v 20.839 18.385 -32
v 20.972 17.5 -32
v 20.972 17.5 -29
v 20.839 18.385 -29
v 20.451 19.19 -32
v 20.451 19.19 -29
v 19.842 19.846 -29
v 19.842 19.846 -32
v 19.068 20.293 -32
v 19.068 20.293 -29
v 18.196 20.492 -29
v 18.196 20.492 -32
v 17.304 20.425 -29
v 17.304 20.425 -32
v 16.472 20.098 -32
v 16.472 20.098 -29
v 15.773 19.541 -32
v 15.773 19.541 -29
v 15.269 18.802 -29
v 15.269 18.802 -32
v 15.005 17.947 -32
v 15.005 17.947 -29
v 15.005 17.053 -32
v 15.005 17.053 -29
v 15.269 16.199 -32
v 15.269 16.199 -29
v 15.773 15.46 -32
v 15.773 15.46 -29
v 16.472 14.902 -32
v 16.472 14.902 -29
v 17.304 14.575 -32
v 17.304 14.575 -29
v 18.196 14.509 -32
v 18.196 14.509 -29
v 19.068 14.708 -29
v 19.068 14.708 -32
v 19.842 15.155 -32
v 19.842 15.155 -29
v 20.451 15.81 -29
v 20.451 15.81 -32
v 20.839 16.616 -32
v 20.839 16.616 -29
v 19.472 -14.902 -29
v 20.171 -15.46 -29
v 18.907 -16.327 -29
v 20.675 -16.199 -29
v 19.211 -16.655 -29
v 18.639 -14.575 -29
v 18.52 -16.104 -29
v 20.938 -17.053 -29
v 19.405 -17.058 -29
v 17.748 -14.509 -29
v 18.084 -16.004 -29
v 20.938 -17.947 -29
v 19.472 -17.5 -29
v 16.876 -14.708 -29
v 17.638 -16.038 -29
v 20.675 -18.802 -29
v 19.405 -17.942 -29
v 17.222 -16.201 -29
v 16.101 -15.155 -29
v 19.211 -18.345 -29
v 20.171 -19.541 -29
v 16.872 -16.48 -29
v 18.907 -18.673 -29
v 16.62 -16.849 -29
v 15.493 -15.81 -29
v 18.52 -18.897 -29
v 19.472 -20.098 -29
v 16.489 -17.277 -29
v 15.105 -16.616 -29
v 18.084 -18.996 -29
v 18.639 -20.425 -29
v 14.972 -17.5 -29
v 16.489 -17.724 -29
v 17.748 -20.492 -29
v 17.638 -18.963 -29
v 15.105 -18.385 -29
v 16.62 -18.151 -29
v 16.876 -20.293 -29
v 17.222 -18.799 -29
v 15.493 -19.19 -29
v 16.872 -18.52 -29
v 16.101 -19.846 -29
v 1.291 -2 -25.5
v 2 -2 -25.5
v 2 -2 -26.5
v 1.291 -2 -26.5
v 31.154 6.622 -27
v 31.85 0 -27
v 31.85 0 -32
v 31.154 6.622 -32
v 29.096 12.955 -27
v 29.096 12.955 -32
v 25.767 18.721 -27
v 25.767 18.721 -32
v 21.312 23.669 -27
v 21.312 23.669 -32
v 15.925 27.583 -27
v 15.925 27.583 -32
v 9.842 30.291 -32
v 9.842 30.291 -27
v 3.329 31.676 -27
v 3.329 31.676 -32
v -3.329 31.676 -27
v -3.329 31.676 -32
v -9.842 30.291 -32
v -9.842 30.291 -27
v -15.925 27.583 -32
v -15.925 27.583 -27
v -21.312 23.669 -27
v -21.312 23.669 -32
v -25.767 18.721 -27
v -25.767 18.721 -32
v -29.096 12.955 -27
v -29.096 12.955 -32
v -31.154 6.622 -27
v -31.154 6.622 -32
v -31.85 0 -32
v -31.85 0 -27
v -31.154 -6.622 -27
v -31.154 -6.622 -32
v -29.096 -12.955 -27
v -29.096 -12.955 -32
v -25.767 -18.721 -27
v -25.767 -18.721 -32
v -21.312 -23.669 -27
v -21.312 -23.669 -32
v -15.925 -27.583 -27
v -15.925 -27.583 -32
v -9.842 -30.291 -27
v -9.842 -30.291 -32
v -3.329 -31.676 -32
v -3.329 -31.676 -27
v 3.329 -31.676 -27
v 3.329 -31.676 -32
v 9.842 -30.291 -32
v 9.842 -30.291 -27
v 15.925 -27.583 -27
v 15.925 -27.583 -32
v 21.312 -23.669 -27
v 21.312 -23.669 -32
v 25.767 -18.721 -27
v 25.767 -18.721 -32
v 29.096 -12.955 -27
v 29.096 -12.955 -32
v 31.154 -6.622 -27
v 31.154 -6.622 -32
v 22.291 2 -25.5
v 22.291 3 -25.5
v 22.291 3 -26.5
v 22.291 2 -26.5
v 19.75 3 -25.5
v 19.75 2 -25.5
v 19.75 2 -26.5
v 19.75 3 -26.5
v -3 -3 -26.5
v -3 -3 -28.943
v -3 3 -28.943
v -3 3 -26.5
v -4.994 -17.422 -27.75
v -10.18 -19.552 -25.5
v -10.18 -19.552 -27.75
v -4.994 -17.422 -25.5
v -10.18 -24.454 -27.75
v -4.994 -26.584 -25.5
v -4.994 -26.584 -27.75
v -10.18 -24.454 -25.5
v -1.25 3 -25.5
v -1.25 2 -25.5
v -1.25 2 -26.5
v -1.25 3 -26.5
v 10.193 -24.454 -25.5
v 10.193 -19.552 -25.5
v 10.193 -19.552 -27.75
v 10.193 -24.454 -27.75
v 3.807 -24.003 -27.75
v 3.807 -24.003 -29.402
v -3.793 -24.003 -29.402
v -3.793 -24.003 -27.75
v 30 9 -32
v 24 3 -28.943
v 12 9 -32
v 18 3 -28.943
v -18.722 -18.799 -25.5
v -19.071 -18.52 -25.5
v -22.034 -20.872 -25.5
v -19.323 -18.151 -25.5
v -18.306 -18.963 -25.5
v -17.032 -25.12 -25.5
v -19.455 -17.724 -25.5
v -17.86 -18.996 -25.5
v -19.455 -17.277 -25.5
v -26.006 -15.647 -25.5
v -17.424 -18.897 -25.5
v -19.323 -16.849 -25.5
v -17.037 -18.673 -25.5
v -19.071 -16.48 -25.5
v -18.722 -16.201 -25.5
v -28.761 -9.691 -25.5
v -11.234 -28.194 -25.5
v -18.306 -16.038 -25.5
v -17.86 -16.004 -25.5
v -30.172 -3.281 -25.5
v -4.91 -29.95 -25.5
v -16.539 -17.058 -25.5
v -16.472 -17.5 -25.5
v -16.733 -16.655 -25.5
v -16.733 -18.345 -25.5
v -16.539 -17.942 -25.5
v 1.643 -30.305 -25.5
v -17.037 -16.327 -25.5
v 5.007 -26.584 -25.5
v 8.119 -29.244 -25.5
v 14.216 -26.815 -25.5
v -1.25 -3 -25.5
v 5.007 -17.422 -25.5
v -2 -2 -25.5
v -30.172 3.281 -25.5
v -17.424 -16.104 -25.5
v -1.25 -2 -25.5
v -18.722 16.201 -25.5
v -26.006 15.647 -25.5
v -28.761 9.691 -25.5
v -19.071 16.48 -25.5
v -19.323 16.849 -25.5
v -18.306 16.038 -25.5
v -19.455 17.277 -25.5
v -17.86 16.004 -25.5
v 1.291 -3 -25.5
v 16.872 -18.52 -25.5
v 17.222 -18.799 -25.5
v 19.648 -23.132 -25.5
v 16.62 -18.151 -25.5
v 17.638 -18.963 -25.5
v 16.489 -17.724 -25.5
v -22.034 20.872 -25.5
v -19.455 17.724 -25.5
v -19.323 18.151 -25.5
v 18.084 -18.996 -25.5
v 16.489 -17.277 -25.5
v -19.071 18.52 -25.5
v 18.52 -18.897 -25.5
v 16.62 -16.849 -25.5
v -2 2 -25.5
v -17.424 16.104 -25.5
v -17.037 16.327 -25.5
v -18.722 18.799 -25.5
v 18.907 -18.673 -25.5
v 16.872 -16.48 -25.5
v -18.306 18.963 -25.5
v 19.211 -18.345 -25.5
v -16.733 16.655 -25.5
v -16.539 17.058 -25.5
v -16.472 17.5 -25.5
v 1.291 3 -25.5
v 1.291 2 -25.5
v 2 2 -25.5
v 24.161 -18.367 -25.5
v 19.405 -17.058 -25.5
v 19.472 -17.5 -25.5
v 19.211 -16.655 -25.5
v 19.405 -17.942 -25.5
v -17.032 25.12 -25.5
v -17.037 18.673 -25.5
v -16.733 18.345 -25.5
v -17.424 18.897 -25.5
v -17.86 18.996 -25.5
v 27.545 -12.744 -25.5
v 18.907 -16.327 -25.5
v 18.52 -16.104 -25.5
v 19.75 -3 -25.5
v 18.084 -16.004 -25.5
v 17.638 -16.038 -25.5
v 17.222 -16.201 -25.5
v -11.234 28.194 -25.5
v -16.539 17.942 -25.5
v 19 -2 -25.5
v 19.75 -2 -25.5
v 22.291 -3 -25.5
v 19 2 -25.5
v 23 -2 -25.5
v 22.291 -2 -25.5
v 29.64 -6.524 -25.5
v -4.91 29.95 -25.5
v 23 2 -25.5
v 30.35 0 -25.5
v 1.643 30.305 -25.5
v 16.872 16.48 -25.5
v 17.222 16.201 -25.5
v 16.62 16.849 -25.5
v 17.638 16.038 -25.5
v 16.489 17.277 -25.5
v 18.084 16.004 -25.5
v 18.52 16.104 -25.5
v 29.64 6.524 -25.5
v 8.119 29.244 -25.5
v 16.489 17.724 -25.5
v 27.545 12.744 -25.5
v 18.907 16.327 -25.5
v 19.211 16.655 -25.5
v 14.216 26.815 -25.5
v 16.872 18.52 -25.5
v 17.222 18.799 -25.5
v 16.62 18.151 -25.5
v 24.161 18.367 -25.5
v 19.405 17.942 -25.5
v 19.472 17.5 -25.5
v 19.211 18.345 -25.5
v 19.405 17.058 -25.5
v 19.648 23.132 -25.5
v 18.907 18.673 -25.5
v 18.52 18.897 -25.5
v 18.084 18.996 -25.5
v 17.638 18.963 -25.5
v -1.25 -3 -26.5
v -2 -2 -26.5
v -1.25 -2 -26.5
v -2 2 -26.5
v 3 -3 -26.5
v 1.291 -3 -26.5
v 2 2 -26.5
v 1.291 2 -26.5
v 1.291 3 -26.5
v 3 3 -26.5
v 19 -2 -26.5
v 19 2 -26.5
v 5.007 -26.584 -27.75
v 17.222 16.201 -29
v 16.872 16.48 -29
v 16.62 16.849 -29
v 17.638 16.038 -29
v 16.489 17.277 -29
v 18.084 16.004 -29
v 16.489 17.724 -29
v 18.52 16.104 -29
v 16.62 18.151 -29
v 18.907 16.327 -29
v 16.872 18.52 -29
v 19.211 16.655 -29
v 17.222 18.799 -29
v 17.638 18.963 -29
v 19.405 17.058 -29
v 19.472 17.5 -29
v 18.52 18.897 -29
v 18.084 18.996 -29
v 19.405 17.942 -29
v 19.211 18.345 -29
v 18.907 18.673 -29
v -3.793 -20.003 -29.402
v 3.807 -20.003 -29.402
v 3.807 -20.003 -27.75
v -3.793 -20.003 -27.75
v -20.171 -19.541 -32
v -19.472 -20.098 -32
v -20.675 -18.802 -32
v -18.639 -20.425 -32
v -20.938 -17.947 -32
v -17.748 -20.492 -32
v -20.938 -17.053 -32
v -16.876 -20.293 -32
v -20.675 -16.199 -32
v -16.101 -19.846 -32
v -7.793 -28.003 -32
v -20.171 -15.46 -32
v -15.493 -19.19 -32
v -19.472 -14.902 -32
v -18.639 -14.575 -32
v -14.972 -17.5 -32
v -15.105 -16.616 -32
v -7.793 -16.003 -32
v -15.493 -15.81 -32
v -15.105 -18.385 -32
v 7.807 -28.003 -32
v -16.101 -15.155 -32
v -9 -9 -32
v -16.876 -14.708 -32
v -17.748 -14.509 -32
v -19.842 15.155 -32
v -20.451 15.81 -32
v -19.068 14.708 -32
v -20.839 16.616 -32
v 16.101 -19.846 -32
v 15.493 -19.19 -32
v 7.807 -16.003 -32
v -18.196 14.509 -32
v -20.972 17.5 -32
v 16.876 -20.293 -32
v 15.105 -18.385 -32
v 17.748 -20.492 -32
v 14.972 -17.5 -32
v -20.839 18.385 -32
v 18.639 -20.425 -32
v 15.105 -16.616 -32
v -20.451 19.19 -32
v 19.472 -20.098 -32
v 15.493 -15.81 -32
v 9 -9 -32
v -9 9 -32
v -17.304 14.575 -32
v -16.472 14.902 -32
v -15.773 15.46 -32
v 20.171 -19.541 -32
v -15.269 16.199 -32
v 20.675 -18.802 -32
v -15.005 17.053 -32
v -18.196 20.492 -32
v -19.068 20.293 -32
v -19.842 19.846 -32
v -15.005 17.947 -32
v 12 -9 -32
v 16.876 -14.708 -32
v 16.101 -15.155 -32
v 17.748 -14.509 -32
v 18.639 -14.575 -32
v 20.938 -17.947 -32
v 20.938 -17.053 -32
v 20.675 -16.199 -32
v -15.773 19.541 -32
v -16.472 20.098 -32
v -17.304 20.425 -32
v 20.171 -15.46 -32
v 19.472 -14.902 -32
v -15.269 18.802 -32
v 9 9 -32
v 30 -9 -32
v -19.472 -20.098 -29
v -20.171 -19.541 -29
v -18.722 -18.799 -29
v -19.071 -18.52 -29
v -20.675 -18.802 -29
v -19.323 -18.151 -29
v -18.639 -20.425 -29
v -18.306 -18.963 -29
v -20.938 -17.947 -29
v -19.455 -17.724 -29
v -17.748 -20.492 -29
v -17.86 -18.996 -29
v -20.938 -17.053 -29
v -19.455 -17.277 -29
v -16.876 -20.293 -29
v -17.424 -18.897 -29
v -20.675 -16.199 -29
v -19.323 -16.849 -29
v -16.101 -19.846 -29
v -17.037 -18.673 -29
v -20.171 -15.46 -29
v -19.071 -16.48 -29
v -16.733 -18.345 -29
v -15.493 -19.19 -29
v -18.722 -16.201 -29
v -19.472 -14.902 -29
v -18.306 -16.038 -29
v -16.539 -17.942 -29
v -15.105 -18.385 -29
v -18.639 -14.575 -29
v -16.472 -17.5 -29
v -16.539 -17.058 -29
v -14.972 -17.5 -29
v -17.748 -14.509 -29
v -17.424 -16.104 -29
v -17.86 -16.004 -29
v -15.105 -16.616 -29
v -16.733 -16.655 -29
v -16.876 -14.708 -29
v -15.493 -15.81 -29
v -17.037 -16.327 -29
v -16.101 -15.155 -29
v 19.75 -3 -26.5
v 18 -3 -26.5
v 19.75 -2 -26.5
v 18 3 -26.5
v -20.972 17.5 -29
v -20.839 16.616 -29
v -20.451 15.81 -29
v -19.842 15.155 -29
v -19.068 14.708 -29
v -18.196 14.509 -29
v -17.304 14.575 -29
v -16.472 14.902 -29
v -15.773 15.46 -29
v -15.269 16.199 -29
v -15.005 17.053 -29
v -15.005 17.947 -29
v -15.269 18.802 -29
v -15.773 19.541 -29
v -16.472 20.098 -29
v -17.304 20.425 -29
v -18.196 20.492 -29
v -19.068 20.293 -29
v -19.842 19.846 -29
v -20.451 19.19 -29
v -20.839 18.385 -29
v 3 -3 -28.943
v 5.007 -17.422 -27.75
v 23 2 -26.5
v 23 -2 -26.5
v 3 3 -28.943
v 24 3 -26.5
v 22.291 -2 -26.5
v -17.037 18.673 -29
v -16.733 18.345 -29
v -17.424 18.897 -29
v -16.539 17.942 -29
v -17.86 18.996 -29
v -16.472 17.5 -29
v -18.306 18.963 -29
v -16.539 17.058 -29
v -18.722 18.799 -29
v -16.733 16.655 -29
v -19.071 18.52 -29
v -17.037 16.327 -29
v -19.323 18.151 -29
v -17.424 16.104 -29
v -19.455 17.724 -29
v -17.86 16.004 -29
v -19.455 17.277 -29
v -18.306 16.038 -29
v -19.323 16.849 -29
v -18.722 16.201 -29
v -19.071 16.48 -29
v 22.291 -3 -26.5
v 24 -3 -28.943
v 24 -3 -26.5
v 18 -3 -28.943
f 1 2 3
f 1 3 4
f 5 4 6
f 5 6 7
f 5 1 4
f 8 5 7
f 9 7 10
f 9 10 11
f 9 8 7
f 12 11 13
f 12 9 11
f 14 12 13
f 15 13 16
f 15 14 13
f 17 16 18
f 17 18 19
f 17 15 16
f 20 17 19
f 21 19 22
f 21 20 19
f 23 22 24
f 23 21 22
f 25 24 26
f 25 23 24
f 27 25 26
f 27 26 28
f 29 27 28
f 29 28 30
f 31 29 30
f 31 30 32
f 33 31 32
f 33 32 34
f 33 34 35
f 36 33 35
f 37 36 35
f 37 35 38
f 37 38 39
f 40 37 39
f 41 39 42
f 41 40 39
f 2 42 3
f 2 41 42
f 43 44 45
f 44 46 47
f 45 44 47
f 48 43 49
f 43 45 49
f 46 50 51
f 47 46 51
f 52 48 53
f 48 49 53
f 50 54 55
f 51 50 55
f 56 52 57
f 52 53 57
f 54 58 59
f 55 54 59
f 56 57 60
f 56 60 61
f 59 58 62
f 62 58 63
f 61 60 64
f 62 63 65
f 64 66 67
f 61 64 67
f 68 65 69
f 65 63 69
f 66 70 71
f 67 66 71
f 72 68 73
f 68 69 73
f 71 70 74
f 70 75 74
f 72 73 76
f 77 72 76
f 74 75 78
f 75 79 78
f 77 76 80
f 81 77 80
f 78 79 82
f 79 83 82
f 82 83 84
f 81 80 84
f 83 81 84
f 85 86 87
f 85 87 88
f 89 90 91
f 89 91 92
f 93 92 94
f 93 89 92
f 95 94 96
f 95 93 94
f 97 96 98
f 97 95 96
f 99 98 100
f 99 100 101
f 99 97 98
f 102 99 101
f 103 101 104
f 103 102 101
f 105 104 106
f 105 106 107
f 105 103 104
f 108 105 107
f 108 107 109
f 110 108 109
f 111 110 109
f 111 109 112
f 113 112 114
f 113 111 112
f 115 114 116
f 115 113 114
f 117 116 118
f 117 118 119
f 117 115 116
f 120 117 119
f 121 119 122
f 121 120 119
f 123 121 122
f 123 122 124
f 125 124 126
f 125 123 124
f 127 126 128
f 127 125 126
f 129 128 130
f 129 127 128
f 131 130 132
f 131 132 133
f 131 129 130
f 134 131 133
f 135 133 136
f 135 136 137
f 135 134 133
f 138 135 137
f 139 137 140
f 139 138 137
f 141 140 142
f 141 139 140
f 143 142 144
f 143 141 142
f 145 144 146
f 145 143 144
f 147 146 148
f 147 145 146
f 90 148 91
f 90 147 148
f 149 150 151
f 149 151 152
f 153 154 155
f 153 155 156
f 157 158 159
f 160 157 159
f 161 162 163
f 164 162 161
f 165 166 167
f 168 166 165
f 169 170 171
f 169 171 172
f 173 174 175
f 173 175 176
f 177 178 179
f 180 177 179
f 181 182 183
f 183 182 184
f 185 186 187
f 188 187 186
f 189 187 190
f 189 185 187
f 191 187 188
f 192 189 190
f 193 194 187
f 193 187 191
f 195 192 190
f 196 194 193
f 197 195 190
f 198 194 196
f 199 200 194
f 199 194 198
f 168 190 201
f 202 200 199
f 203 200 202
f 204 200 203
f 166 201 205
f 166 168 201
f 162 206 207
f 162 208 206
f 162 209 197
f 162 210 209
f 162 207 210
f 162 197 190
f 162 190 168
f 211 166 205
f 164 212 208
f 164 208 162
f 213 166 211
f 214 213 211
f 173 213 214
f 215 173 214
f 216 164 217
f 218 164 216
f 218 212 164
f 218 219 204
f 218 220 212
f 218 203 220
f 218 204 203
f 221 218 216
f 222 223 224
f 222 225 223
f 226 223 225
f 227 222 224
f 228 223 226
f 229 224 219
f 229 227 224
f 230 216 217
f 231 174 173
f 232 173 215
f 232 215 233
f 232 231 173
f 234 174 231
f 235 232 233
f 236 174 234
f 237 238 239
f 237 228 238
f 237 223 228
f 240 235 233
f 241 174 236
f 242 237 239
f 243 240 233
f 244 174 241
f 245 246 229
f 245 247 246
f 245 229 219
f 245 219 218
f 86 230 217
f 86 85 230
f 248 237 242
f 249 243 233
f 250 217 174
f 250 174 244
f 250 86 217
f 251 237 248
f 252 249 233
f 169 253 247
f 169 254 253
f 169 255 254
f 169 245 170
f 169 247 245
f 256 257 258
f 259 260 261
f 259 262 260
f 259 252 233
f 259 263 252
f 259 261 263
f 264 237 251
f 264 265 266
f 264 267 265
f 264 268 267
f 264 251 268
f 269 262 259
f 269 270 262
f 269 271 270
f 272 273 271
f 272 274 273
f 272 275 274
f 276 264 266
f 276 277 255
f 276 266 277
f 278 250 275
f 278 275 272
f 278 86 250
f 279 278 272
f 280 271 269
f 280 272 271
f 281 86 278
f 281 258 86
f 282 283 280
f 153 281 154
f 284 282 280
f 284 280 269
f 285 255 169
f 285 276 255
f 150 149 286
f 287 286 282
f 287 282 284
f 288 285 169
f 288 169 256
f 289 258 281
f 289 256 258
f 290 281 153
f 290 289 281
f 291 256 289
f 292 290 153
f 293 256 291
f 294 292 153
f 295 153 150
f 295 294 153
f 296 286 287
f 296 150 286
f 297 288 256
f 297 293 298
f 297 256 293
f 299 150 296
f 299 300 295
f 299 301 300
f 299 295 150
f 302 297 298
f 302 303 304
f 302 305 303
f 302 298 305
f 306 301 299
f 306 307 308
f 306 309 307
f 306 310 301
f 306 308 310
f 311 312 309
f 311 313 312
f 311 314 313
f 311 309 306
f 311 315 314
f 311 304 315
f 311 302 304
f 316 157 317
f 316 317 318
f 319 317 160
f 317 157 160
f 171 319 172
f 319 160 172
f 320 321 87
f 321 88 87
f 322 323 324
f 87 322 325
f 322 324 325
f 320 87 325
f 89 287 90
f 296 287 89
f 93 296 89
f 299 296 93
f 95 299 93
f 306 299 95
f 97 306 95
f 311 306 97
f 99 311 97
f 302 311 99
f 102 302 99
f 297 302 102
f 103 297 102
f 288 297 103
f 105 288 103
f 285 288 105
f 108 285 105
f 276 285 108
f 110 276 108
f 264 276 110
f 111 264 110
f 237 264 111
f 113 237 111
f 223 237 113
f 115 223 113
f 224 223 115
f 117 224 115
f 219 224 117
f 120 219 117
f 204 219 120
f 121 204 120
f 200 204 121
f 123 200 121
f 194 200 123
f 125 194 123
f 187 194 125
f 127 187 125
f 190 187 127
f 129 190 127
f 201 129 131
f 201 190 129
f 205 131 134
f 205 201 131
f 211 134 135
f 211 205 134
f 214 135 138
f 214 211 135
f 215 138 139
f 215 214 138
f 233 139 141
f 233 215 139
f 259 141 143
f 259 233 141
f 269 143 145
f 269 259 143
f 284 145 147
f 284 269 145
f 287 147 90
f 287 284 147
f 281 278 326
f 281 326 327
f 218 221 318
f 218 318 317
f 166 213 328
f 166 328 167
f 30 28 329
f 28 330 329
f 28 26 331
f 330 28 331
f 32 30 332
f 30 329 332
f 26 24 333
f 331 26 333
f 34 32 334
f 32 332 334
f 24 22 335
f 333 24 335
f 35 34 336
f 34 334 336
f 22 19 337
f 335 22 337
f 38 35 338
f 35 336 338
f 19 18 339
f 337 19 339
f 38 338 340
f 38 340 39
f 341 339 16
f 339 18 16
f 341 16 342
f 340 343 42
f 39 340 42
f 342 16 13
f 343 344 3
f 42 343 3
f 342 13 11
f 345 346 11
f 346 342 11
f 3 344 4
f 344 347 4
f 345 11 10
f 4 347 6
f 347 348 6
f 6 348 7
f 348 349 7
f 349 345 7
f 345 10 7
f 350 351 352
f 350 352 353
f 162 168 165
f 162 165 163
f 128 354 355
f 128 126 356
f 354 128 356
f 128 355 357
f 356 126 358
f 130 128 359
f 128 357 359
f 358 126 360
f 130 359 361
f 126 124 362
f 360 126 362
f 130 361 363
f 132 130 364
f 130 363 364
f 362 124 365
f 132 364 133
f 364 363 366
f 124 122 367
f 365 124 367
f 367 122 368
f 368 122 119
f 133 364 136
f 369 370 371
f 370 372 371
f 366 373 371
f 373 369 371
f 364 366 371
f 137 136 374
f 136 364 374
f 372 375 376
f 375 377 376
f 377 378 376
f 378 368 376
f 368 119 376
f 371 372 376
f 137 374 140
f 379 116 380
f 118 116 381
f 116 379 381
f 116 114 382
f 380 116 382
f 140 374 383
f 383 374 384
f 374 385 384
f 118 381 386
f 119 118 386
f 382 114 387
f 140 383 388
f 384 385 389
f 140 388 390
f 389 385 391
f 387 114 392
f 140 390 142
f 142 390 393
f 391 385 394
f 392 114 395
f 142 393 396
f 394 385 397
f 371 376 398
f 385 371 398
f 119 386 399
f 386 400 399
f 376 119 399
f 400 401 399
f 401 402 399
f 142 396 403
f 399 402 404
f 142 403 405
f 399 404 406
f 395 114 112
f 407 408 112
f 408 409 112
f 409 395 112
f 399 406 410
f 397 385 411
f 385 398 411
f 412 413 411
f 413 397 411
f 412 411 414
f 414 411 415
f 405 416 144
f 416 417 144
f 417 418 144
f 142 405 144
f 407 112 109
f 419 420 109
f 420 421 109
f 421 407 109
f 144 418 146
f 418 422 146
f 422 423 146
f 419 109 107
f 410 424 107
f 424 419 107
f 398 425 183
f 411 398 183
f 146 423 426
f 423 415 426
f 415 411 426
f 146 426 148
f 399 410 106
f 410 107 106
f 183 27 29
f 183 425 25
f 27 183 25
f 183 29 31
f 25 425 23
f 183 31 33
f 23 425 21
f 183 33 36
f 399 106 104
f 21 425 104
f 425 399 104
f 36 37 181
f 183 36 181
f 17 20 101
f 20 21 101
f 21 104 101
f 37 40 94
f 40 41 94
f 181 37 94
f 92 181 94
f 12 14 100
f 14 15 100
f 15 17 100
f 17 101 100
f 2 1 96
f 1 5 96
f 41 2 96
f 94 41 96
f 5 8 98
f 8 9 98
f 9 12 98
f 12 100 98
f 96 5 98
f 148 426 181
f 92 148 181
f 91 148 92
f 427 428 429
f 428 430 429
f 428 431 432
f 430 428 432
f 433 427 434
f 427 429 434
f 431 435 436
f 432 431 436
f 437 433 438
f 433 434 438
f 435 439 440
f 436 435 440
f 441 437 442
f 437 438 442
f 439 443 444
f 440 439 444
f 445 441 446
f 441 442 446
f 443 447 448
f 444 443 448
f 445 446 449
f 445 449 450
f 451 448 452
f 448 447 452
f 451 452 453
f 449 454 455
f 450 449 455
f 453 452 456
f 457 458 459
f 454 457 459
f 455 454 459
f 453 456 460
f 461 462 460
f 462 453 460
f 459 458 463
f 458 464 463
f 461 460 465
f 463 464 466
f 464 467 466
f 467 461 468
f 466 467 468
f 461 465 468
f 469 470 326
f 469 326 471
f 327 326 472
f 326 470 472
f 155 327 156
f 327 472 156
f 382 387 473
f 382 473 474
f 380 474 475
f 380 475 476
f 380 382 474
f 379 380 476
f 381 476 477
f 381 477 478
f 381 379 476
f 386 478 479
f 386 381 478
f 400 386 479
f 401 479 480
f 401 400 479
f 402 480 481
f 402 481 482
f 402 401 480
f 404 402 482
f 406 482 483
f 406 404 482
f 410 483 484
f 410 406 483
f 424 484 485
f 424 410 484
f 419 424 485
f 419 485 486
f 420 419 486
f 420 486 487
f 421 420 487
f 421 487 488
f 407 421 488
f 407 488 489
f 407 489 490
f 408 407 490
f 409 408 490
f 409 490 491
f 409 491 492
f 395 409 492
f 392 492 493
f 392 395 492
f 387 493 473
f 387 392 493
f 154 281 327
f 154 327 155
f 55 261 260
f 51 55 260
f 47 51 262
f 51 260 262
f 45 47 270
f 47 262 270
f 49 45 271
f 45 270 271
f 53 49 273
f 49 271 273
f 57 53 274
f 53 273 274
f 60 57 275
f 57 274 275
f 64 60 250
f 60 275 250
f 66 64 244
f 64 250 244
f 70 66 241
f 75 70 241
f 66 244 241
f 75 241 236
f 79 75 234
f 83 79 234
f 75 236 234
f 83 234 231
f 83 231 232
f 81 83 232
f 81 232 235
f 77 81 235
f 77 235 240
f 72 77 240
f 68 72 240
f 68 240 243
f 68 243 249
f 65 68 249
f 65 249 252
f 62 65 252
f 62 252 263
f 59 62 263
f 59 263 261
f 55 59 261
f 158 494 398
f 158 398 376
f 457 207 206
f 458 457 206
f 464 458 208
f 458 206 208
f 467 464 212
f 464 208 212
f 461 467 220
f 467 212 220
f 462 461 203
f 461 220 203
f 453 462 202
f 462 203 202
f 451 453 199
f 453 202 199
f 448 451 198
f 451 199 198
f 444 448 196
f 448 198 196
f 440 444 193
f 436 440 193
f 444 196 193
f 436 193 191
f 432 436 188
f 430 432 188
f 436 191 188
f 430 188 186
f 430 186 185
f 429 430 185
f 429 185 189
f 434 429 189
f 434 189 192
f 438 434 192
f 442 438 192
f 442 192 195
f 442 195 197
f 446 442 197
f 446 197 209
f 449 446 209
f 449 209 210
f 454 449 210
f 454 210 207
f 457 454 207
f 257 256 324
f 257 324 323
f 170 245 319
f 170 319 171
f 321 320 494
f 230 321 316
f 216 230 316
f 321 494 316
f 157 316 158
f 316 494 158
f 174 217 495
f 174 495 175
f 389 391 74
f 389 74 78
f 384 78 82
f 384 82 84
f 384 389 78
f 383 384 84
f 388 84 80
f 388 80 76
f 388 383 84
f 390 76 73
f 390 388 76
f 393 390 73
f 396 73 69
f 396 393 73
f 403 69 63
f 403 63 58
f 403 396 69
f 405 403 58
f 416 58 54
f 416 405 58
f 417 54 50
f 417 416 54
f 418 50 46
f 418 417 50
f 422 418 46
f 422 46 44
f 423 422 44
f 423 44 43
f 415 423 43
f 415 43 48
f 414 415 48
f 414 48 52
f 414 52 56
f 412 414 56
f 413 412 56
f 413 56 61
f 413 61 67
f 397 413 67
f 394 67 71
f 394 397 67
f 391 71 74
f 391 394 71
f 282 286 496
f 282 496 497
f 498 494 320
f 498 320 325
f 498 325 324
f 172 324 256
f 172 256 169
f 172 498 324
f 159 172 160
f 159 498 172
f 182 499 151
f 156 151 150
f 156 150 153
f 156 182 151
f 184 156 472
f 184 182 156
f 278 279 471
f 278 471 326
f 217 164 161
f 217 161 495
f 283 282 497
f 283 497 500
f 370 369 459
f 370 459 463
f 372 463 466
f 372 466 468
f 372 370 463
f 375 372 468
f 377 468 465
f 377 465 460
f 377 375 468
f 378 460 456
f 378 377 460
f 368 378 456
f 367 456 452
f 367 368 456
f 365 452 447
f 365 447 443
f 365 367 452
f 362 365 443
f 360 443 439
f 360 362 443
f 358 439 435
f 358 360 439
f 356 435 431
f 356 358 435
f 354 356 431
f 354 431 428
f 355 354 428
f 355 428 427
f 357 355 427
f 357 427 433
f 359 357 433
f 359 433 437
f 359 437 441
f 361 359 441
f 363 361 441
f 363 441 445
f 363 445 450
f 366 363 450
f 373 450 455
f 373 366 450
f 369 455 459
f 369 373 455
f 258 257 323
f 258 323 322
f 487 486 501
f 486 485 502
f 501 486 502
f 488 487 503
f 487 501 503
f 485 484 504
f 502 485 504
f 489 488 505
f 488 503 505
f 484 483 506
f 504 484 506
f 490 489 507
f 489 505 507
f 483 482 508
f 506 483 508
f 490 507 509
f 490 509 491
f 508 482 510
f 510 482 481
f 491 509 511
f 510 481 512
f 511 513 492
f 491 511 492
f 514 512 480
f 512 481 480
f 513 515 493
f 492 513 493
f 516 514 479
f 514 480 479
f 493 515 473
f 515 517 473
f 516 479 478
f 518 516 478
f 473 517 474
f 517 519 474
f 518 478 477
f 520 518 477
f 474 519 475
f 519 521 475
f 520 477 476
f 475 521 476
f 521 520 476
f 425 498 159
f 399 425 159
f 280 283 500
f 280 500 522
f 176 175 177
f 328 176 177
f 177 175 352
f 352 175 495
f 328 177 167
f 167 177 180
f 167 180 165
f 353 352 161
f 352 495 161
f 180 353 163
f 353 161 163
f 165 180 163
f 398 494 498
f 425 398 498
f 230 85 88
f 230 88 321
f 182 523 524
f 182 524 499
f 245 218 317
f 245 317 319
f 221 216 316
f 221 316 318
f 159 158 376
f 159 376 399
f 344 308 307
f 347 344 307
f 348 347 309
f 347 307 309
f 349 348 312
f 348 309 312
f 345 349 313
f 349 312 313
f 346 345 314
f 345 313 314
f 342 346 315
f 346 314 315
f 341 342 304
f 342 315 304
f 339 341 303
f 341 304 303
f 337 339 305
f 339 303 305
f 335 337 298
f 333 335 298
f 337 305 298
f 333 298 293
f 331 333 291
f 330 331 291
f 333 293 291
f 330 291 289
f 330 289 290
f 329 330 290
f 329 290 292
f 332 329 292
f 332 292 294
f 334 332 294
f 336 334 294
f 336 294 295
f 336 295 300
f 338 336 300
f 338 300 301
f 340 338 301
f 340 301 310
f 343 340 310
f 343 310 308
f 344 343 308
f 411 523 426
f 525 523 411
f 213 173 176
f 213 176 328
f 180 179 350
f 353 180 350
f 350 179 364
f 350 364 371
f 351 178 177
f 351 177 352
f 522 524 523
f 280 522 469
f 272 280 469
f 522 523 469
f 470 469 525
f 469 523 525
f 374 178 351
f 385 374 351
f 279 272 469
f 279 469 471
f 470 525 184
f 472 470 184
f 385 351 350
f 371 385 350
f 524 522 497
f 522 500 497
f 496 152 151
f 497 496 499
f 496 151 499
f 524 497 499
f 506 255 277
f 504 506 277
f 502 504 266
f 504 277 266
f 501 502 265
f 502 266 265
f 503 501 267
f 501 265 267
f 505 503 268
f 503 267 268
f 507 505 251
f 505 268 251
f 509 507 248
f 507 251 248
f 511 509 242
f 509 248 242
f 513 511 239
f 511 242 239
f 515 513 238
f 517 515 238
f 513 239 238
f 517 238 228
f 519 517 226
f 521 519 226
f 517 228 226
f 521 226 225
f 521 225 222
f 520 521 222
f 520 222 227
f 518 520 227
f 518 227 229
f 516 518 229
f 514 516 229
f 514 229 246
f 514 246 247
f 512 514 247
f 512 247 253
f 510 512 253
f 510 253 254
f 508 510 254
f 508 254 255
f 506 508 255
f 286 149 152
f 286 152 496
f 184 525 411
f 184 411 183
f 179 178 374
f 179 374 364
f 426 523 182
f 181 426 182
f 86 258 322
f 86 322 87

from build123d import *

# Parameters (mm, degrees)
SKETCH2_R           = 31.85
BOSS_EXTRUDE1_DEPTH = 6.5
SKETCH3_W           = 6
SKETCH3_H           = 6
CUT_EXTRUDE1_DEPTH  = 6.5
CHAMFER1_SIZE       = 6
CHAMFER1_SIZE2      = 3.057152697
SKETCH5_R           = 1.5
CUT_EXTRUDE2_DEPTH  = 56.252556502
SKETCH6_R           = 3
CUT_EXTRUDE3_DEPTH  = 3
CHAMFER3_SIZE       = 1.5
BOSS_EXTRUDE2_DEPTH = 1
SKETCH10_W          = 7.6
SKETCH10_H          = 4
CUT_EXTRUDE5_DEPTH  = 46.509284767
CUT_EXTRUDE6_DEPTH  = 2.25
CHAMFER4_SIZE       = 4
CHAMFER4_SIZE2      = 2.597630373


with BuildPart() as part:
    # Sketch2 → Boss-Extrude1 (new body)
    with BuildSketch(Plane.XY.offset(-25.5)):
        Circle(SKETCH2_R)
    extrude(amount=-BOSS_EXTRUDE1_DEPTH)

    # Sketch3 → Cut-Extrude1 (cut)
    with BuildSketch(Plane(origin=(0, 0, -32), x_dir=(-1, 0, 0), z_dir=(0, 0, -1))):
        with Locations((-21, 0)):
            Rectangle(SKETCH3_W, SKETCH3_H)
        Rectangle(SKETCH3_W, SKETCH3_H)
    extrude(amount=-CUT_EXTRUDE1_DEPTH, mode=Mode.SUBTRACT)

    # Chamfer1
    chamfer1_edges = [part.edges().sort_by_distance(p)[0] for p in [
        (3, 0, -32),
        (0, -3, -32),
        (-3, 0, -32),
        (0, 3, -32),
        (24, 0, -32),
        (21, -3, -32),
        (18, 0, -32),
        (21, 3, -32),
    ]]
    chamfer1_side = [part.faces().sort_by_distance(p)[0] for p in [
        (-30.949145961, 0, -32),
    ]]
    chamfer(chamfer1_edges, length=CHAMFER1_SIZE, length2=CHAMFER1_SIZE2, reference=chamfer1_side[0])

    # Sketch5 → Cut-Extrude2 (cut, through all)
    with BuildSketch(Plane.XY):
        with Locations((-17.971861544, -17.500238124)):
            Circle(SKETCH5_R)
        with Locations((17.971861544, -17.500238124)):
            Circle(SKETCH5_R)
        with Locations((17.971861544, 17.500238124)):
            Circle(SKETCH5_R)
        with Locations((-17.971861544, 17.500238124)):
            Circle(SKETCH5_R)
    extrude(amount=-CUT_EXTRUDE2_DEPTH, mode=Mode.SUBTRACT)

    # Sketch6 → Cut-Extrude3 (cut)
    with BuildSketch(Plane.XY.offset(-32)):
        with Locations((-17.971861544, -17.500238124)):
            Circle(SKETCH6_R)
        with Locations(Location((17.971861544, -17.500238124, 0), (0, 0, 180))):
            Circle(SKETCH6_R)
        with Locations((17.971861544, 17.500238124)):
            Circle(SKETCH6_R)
        with Locations(Location((-17.971861544, 17.500238124, 0), (0, 0, 180))):
            Circle(SKETCH6_R)
    extrude(amount=CUT_EXTRUDE3_DEPTH, mode=Mode.SUBTRACT)

    # Chamfer3
    chamfer3_edges = [part.edges().sort_by_distance(p)[0] for p in [
        (-31.85, 0, -25.5),
    ]]
    chamfer(chamfer3_edges, length=CHAMFER3_SIZE)

    # Sketch7 → Boss-Extrude2 (add)
    with BuildSketch(Plane.XY.offset(-25.5)):
        Polygon((-1.25, -2), (-2, -2), (-2, 2), (-1.25, 2), (-1.25, 3), (-3, 3), (-3, -3), (-1.25, -3), align=None)
        Polygon((1.2909118, -3), (3, -3), (3, 3), (1.2909118, 3), (1.2909118, 2), (2, 2), (2, -2), (1.2909118, -2), align=None)
        Polygon((19.75, -2), (19, -2), (19, 2), (19.75, 2), (19.75, 3), (18, 3), (18, -3), (19.75, -3), align=None)
        Polygon((22.2909118, -3), (24, -3), (24, 3), (22.2909118, 3), (22.2909118, 2), (23, 2), (23, -2), (22.2909118, -2), align=None)
    extrude(amount=-BOSS_EXTRUDE2_DEPTH)

    # Sketch10 → Cut-Extrude5 (cut, through all)
    with BuildSketch(Plane(origin=(0, 0, -32), x_dir=(-1, 0, 0), z_dir=(0, 0, -1))):
        with Locations((-0.006825443, -22.003067008)):
            Rectangle(SKETCH10_W, SKETCH10_H)
    extrude(amount=-CUT_EXTRUDE5_DEPTH, mode=Mode.SUBTRACT)

    # Sketch11 → Cut-Extrude6 (cut)
    with BuildSketch(Plane.XY.offset(-25.5)):
        Polygon((-4.993522574, -17.422135009), (5.007173461, -17.422135009), (10.193224733, -19.552209326), (10.193224733, -24.45392469), (5.007173461, -26.583999007), (-4.993522574, -26.583999007), (-10.179573846, -24.45392469), (-10.179573846, -19.552209326), align=None)
    extrude(amount=-CUT_EXTRUDE6_DEPTH, mode=Mode.SUBTRACT)

    # Chamfer4
    chamfer4_edges = [part.edges().sort_by_distance(p)[0] for p in [
        (-3.793174557, -22.003067008, -32),
        (0.006825443, -20.003067008, -32),
        (3.806825443, -22.003067008, -32),
        (0.006825443, -24.003067008, -32),
    ]]
    chamfer4_side = [part.faces().sort_by_distance(p)[0] for p in [
        (-30.949145961, 0, -32),
    ]]
    chamfer(chamfer4_edges, length=CHAMFER4_SIZE, length2=CHAMFER4_SIZE2, reference=chamfer4_side[0])


solid = part.part
